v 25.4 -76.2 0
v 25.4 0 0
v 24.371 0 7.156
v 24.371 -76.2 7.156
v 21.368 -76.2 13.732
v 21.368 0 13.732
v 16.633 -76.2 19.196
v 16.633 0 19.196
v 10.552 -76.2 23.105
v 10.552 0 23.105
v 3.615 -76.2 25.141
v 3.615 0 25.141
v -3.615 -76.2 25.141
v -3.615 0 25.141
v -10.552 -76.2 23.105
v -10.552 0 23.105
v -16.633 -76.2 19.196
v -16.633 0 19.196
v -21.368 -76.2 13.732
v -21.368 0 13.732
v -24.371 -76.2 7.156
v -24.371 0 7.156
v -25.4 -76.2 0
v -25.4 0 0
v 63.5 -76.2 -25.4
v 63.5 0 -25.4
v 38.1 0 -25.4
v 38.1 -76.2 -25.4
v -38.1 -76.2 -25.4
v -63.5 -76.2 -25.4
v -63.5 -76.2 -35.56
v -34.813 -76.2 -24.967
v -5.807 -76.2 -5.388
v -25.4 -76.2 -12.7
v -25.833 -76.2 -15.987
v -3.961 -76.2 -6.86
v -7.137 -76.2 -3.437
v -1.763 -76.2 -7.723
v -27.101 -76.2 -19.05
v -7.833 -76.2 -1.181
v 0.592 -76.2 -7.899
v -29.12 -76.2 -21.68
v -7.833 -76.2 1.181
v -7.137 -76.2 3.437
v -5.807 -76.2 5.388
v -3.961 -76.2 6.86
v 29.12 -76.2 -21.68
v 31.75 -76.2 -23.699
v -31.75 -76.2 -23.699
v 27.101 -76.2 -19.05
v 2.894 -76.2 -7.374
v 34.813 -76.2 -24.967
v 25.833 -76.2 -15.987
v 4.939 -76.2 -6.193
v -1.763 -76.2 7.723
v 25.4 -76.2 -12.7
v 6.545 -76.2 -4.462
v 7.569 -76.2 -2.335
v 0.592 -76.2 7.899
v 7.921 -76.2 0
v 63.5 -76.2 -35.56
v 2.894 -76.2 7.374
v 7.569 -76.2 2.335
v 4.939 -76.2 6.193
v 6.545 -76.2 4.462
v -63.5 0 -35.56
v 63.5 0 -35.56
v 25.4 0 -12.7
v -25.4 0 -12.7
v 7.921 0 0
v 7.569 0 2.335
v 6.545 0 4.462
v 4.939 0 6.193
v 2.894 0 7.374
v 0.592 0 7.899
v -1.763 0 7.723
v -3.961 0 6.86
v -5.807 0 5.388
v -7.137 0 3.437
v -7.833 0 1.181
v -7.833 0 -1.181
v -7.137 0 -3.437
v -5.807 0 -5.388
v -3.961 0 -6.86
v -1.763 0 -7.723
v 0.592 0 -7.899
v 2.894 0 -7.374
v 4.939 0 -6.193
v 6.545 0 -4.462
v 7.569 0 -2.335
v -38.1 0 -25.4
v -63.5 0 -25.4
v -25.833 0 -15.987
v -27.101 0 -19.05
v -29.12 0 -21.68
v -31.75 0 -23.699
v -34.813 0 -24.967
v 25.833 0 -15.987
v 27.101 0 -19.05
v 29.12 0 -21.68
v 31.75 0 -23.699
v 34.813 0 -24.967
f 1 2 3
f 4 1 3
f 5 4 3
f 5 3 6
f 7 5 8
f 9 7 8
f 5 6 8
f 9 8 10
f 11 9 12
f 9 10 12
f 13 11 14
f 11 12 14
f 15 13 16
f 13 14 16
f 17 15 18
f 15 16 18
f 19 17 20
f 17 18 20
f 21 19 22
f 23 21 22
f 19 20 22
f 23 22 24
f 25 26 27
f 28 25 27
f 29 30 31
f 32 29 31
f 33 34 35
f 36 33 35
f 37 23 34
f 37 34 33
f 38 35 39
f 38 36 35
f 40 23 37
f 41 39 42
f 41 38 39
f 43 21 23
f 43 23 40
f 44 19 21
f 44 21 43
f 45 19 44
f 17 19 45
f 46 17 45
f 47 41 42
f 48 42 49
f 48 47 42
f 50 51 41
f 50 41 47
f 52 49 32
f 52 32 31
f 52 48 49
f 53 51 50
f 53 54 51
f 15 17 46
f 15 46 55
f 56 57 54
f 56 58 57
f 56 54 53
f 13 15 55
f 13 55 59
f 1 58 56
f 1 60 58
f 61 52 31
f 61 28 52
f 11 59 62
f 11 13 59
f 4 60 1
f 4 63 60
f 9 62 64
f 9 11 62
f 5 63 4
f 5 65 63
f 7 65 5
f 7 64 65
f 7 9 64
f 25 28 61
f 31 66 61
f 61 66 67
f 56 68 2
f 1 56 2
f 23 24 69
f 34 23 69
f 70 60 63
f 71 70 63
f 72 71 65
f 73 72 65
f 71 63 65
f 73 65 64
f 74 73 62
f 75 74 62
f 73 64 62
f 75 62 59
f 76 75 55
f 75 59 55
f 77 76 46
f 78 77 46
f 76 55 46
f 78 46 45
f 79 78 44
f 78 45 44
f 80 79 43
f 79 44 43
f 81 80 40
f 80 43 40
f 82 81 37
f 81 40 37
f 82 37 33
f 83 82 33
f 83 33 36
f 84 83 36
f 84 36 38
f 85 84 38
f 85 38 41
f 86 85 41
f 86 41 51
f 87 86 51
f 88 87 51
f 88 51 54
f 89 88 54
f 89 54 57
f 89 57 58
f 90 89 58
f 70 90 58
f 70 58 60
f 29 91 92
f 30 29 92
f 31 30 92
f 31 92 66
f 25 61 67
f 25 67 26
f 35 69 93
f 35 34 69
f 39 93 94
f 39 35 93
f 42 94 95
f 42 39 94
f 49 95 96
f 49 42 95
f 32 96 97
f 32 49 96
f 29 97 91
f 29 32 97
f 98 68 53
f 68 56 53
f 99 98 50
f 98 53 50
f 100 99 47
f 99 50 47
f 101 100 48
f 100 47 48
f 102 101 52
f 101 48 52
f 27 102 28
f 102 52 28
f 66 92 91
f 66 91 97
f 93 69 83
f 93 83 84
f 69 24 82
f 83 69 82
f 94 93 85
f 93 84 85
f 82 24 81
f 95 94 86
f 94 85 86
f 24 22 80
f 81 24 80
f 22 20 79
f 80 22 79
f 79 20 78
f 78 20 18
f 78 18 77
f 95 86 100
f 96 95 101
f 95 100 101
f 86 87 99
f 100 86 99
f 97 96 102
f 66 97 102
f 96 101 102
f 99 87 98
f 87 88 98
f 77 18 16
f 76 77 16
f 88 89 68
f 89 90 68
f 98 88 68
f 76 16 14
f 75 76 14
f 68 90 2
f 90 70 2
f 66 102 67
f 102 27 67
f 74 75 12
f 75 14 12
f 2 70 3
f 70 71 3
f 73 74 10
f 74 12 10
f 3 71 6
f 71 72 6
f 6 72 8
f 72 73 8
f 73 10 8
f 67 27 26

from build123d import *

# Parameters (mm, degrees)
F1_DEPTH = 76.2
F2_R     = 12.7
F3_R     = 7.921290647
F4_DEPTH = 101.6


# Not quite as in the source:
# - a feature names something its author has since deleted; it is built from what else it names


with BuildPart() as f1:
    # F0 (on Front) → F1 (new body)
    with BuildSketch(Plane.XZ):
        with BuildLine():
            Line((25.4, -25.4), (25.4, 0))
            ThreePointArc((25.4, 0), (0, 25.4), (-25.4, 0))
            Line((-25.4, 0), (-25.4, -25.4))
            Line((-25.4, -25.4), (-63.5, -25.4))
            Line((-63.5, -25.4), (-63.5, -35.56))
            Line((-63.5, -35.56), (63.5, -35.56))
            Line((63.5, -35.56), (63.5, -25.4))
            Line((63.5, -25.4), (25.4, -25.4))
        make_face()
    extrude(amount=F1_DEPTH)

    # F2
    f2_edges = [f1.edges().sort_by_distance(p)[0] for p in [
        (25.4, -38.1, -25.4),
        (-25.4, -38.1, -25.4),
    ]]
    fillet(f2_edges, radius=F2_R)

    # F3 (on face) → F4 (cut)
    with BuildSketch(Plane.XZ.offset(76.2)):
        Circle(F3_R)
    extrude(amount=-F4_DEPTH, mode=Mode.SUBTRACT)


solid = f1.part
